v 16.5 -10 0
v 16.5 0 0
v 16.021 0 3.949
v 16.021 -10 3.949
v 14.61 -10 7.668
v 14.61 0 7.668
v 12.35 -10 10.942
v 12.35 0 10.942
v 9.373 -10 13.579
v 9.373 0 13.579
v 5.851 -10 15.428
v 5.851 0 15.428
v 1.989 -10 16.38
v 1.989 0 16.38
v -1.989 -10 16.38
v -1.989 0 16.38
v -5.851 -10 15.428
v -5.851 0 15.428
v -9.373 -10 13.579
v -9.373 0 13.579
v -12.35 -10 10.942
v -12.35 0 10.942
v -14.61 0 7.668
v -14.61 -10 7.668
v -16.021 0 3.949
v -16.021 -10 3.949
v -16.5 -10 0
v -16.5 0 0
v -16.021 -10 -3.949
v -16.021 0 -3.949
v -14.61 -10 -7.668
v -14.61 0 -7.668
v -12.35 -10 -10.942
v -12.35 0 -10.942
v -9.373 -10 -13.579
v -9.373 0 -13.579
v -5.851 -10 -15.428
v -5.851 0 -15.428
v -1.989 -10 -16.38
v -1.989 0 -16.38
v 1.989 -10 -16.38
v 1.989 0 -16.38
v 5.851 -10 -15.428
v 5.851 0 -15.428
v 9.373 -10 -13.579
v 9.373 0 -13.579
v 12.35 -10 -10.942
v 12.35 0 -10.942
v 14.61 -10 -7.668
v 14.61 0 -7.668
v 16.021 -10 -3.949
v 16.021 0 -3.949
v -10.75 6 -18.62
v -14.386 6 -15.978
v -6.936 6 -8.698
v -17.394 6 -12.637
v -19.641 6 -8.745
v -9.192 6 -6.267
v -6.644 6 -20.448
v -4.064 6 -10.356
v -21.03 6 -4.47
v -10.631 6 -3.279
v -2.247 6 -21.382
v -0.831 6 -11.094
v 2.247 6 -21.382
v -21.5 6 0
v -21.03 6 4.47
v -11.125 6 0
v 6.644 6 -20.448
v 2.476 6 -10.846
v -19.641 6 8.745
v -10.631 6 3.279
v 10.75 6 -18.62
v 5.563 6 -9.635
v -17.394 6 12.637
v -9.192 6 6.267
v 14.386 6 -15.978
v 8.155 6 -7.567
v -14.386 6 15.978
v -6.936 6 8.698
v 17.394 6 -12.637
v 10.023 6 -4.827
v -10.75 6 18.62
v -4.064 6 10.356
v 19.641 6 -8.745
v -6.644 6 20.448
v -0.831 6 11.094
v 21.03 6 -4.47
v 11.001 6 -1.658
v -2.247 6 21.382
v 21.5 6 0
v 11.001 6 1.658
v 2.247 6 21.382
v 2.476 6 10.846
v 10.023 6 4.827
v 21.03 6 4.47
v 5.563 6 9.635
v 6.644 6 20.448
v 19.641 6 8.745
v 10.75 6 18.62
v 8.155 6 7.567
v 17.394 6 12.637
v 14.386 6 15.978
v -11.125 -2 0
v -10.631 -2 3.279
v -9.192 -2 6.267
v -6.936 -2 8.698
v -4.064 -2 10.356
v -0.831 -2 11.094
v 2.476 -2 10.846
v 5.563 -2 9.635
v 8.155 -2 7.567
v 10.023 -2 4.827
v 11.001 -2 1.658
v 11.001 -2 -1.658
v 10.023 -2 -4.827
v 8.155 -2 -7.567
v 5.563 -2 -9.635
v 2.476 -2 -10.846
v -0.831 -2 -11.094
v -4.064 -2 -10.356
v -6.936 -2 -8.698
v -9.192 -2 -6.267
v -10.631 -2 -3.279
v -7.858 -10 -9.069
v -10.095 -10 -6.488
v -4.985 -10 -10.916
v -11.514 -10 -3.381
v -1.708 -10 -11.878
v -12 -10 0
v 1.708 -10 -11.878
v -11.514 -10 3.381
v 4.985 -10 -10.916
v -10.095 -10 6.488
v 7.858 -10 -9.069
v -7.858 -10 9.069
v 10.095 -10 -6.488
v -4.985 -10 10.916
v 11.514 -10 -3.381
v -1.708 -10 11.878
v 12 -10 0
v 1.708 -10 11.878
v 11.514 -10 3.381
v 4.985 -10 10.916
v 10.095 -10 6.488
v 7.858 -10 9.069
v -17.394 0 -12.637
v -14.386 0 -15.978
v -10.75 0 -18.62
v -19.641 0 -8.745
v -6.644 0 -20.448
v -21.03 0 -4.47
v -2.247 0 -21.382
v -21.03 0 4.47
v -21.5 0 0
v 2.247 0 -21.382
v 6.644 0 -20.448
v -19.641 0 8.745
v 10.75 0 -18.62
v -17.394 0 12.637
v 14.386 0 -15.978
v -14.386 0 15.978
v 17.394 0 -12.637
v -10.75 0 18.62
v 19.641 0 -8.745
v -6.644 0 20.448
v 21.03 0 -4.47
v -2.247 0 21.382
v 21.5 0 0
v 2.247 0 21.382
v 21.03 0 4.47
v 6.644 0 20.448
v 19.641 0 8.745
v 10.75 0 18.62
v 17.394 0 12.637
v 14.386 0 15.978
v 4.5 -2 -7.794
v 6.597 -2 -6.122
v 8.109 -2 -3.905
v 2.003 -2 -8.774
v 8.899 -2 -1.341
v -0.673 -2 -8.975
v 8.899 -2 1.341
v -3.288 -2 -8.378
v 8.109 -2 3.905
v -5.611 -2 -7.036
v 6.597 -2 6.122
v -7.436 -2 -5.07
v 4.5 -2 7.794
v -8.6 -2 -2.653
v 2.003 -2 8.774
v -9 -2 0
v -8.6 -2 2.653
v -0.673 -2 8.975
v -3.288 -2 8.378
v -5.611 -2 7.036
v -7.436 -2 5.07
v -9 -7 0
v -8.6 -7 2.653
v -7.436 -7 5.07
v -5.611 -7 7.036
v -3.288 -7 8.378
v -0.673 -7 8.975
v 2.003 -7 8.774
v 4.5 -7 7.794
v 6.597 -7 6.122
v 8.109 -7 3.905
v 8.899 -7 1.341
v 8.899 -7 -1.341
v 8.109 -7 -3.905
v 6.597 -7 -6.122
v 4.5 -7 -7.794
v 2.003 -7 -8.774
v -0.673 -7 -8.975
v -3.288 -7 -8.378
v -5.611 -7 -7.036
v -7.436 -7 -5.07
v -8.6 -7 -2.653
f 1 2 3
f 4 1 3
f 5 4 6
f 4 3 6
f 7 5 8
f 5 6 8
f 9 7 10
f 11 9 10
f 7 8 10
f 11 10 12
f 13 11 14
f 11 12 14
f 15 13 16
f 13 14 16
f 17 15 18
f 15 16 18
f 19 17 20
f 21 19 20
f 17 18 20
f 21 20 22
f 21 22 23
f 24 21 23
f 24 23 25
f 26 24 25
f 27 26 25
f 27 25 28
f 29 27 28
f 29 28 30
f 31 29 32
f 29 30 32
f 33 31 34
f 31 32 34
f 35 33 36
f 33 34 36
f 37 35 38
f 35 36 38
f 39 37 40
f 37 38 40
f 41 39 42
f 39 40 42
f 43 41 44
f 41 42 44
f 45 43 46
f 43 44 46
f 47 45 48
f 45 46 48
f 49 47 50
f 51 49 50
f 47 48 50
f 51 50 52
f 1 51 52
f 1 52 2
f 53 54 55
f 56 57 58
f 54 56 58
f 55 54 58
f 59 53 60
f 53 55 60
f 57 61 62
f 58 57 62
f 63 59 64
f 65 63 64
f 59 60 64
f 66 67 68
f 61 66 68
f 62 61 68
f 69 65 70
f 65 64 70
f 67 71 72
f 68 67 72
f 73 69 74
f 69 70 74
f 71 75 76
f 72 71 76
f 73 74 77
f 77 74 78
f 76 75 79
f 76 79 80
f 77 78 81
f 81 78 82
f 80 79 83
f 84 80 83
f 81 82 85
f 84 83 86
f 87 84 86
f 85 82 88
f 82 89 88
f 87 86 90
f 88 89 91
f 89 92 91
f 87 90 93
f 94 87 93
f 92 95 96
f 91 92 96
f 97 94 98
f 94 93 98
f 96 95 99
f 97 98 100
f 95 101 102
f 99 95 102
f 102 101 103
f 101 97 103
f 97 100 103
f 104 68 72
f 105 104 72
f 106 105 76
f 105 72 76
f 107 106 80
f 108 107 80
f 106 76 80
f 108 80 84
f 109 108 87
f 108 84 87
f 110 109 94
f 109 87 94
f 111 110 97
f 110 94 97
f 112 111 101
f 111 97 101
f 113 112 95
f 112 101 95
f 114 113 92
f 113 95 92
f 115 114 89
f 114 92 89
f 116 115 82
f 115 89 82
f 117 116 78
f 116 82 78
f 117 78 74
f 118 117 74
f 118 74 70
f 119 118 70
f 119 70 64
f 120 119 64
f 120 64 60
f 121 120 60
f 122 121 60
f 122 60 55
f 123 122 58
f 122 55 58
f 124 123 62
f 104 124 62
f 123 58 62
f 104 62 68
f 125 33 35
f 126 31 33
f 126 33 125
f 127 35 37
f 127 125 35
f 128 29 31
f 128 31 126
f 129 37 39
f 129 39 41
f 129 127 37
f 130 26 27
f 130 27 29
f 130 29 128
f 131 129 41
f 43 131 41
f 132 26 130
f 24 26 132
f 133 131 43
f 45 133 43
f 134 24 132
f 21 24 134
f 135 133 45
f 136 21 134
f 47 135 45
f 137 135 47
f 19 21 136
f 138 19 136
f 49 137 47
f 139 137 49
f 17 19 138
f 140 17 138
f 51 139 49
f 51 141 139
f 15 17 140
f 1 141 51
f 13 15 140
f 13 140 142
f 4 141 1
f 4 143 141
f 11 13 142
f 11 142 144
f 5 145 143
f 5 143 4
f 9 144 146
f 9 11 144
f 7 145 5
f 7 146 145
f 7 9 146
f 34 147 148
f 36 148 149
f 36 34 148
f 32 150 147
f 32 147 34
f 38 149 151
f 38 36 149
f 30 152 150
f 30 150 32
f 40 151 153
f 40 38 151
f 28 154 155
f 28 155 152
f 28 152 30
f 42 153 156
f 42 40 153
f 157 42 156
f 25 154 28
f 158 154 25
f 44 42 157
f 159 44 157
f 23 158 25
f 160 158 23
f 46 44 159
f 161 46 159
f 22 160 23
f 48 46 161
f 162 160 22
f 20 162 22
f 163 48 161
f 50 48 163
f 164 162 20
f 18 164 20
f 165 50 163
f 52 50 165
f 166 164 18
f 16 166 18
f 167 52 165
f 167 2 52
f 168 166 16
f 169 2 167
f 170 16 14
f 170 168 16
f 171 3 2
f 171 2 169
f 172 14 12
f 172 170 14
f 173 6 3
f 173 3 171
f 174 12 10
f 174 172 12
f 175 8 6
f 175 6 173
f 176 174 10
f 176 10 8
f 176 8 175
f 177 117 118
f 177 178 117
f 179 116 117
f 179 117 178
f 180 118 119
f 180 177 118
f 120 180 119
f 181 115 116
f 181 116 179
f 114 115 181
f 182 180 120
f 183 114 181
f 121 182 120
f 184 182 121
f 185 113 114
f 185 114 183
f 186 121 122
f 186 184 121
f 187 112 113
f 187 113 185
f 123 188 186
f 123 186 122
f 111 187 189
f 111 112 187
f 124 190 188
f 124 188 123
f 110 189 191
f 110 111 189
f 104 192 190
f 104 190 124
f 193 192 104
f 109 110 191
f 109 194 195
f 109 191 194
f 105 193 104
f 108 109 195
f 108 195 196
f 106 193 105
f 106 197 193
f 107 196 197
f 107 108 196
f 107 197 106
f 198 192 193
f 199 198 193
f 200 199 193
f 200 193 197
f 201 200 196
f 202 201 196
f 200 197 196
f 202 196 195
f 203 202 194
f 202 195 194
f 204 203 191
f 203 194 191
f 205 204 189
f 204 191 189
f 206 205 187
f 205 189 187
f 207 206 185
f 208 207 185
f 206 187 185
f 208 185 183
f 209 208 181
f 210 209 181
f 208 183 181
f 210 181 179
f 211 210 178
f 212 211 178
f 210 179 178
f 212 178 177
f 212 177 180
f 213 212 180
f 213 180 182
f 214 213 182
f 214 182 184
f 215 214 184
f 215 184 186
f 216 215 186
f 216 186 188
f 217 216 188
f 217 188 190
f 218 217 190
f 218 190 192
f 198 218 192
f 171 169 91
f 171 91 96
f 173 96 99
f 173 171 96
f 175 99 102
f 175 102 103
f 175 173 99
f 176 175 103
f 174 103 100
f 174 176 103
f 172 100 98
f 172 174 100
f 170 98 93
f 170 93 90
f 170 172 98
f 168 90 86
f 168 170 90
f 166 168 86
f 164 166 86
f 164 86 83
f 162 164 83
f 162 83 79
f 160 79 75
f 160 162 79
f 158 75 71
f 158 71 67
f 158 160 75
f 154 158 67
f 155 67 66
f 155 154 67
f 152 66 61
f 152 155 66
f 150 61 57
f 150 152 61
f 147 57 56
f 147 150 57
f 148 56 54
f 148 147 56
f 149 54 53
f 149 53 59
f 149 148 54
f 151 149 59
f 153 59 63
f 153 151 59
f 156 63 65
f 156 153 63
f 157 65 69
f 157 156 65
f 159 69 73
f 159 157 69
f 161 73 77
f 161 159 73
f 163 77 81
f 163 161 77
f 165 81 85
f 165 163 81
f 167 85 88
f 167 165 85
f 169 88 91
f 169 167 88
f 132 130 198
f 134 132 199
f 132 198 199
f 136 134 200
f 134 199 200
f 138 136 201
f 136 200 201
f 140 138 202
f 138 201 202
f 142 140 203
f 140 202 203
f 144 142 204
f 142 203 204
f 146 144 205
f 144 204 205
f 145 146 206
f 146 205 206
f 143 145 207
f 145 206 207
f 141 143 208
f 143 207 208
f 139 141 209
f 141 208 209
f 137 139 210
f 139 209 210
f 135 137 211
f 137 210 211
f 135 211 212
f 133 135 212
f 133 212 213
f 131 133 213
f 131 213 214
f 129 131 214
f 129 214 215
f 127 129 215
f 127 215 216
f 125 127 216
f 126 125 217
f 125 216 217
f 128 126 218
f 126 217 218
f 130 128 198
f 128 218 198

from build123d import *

# Parameters (mm, degrees)
F0_R     = 21.5
F1_DEPTH = 6
F2_R     = 16.5
F3_DEPTH = 10
F4_R     = 11.125
F5_DEPTH = 8
F6_R     = 9
F7_DEPTH = 8.001
F8_SIZE  = 3


with BuildPart() as f1:
    # F0 (on Front) → F1 (new body)
    with BuildSketch(Plane.XZ):
        Circle(F0_R)
    extrude(amount=-F1_DEPTH)

    # F2 (on face) → F3 (join)
    with BuildSketch(Plane.XZ):
        Circle(F2_R)
    extrude(amount=F3_DEPTH)

    # F4 (on face) → F5 (cut, through all)
    with BuildSketch(Plane(origin=(0, 6, 0), x_dir=(-1, 0, 0), z_dir=(0, 1, 0))):
        Circle(F4_R)
    extrude(amount=-F5_DEPTH, mode=Mode.SUBTRACT)

    # F6 (on face) → F7 (cut, through all)
    with BuildSketch(Plane(origin=(0, -2, 0), x_dir=(-1, 0, 0), z_dir=(0, 1, 0))):
        Circle(F6_R)
    extrude(amount=-F7_DEPTH, mode=Mode.SUBTRACT)

    # F8
    f8_edges = [f1.edges().sort_by_distance(p)[0] for p in [
        (9, -10, 0),
    ]]
    chamfer(f8_edges, length=F8_SIZE)


solid = f1.part
